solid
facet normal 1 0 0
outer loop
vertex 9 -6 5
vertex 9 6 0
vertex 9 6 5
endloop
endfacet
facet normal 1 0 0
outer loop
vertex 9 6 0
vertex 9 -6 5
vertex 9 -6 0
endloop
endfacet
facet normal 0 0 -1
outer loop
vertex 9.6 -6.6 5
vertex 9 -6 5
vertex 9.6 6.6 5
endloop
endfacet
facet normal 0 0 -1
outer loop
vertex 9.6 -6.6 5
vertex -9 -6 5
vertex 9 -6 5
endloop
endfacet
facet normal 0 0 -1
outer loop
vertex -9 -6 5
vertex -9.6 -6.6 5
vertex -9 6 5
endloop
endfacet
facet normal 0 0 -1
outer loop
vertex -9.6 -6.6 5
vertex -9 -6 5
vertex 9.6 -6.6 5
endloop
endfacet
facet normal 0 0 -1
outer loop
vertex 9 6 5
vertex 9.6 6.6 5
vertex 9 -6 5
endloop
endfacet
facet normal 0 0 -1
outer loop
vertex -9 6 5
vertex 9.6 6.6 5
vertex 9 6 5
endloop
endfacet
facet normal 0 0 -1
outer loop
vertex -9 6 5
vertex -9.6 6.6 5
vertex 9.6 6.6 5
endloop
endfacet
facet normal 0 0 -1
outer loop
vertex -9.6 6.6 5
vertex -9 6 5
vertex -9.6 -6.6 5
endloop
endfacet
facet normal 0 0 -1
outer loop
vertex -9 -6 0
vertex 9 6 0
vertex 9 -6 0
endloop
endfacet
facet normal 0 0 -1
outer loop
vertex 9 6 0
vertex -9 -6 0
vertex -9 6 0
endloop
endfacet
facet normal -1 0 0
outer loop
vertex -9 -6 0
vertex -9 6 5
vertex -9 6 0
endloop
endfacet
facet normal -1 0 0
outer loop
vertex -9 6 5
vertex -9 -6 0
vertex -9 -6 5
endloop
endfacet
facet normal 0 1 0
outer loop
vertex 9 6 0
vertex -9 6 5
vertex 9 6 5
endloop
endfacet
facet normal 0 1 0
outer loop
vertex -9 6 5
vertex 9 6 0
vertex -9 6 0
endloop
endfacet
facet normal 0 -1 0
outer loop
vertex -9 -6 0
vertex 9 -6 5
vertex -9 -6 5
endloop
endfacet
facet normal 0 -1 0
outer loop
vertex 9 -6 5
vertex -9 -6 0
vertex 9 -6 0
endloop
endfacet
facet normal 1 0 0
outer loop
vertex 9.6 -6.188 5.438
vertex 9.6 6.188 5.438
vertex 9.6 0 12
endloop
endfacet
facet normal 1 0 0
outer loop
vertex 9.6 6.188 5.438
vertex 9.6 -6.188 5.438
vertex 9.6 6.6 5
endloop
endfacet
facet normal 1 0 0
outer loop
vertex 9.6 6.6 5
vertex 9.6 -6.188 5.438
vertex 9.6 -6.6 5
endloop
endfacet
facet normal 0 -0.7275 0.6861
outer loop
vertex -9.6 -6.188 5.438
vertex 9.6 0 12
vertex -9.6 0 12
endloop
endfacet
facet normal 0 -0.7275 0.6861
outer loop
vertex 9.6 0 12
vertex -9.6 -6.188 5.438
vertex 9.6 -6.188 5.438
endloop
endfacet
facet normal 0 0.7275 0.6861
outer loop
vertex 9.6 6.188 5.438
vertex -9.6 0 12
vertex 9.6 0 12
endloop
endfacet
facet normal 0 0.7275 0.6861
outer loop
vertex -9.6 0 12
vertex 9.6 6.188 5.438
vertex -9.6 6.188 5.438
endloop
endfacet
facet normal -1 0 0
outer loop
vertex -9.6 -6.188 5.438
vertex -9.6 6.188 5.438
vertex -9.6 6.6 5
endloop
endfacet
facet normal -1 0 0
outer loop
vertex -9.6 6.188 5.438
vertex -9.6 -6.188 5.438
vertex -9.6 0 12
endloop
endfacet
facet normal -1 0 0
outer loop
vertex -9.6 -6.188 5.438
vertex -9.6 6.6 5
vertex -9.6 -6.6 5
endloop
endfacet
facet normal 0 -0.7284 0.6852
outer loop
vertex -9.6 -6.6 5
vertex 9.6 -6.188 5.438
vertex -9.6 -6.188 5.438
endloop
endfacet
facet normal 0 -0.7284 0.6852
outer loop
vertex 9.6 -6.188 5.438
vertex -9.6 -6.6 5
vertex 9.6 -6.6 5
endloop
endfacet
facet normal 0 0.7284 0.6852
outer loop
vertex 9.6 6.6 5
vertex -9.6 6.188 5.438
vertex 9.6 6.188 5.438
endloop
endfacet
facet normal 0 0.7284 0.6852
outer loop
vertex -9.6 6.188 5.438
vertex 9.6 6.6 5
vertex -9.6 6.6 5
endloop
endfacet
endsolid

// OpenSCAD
// Lodge / base building — single-storey day lodge. Rectangular plan
// with a steep gable roof so snow sheds off rather than piling up.
//
// Sized relative to the rest of the world: a skier is ~1.7 m tall, a
// lift tower is 18 m, so the lodge eaves at 5 m and the ridge at 12 m
// reads as a substantial-but-not-monumental building.
//
// Conventions, units, and axis docs: see models-src/README.md.

$fn = 16;

// ── Dimensions (metres) ────────────────────────────────────────────────
wall_w = 18.0; // long side, +X primary direction
wall_d = 12.0; // short side, +Y perpendicular
wall_h = 5.0;  // wall height before the gable starts

roof_rise = 7.0;  // ridge height above the wall top — gives ~49° pitch
overhang  = 0.6;  // eaves overhang on every side

// ── Geometry ───────────────────────────────────────────────────────────
// Walls: rectangular box centred on the origin, sitting on Z = 0.
module walls() {
    color("BurlyWood")
        translate([0, 0, wall_h / 2])
            cube([wall_w, wall_d, wall_h], center = true);
}

// Roof: triangular prism running along the long axis (X). linear_extrude
// with scale = [1, 0] tapers Y to zero at the ridge while keeping X
// full-length, so the cross-section in YZ is a triangle whose apex
// (the ridge line) runs along X. The base is slightly larger than the
// walls so the eaves overhang.
module roof() {
    color("DarkSlateGray")
        translate([0, 0, wall_h])
            linear_extrude(height = roof_rise, scale = [1, 0])
                square([wall_w + 2*overhang, wall_d + 2*overhang], center = true);
}

module lodge() {
    walls();
    roof();
}

lodge();
